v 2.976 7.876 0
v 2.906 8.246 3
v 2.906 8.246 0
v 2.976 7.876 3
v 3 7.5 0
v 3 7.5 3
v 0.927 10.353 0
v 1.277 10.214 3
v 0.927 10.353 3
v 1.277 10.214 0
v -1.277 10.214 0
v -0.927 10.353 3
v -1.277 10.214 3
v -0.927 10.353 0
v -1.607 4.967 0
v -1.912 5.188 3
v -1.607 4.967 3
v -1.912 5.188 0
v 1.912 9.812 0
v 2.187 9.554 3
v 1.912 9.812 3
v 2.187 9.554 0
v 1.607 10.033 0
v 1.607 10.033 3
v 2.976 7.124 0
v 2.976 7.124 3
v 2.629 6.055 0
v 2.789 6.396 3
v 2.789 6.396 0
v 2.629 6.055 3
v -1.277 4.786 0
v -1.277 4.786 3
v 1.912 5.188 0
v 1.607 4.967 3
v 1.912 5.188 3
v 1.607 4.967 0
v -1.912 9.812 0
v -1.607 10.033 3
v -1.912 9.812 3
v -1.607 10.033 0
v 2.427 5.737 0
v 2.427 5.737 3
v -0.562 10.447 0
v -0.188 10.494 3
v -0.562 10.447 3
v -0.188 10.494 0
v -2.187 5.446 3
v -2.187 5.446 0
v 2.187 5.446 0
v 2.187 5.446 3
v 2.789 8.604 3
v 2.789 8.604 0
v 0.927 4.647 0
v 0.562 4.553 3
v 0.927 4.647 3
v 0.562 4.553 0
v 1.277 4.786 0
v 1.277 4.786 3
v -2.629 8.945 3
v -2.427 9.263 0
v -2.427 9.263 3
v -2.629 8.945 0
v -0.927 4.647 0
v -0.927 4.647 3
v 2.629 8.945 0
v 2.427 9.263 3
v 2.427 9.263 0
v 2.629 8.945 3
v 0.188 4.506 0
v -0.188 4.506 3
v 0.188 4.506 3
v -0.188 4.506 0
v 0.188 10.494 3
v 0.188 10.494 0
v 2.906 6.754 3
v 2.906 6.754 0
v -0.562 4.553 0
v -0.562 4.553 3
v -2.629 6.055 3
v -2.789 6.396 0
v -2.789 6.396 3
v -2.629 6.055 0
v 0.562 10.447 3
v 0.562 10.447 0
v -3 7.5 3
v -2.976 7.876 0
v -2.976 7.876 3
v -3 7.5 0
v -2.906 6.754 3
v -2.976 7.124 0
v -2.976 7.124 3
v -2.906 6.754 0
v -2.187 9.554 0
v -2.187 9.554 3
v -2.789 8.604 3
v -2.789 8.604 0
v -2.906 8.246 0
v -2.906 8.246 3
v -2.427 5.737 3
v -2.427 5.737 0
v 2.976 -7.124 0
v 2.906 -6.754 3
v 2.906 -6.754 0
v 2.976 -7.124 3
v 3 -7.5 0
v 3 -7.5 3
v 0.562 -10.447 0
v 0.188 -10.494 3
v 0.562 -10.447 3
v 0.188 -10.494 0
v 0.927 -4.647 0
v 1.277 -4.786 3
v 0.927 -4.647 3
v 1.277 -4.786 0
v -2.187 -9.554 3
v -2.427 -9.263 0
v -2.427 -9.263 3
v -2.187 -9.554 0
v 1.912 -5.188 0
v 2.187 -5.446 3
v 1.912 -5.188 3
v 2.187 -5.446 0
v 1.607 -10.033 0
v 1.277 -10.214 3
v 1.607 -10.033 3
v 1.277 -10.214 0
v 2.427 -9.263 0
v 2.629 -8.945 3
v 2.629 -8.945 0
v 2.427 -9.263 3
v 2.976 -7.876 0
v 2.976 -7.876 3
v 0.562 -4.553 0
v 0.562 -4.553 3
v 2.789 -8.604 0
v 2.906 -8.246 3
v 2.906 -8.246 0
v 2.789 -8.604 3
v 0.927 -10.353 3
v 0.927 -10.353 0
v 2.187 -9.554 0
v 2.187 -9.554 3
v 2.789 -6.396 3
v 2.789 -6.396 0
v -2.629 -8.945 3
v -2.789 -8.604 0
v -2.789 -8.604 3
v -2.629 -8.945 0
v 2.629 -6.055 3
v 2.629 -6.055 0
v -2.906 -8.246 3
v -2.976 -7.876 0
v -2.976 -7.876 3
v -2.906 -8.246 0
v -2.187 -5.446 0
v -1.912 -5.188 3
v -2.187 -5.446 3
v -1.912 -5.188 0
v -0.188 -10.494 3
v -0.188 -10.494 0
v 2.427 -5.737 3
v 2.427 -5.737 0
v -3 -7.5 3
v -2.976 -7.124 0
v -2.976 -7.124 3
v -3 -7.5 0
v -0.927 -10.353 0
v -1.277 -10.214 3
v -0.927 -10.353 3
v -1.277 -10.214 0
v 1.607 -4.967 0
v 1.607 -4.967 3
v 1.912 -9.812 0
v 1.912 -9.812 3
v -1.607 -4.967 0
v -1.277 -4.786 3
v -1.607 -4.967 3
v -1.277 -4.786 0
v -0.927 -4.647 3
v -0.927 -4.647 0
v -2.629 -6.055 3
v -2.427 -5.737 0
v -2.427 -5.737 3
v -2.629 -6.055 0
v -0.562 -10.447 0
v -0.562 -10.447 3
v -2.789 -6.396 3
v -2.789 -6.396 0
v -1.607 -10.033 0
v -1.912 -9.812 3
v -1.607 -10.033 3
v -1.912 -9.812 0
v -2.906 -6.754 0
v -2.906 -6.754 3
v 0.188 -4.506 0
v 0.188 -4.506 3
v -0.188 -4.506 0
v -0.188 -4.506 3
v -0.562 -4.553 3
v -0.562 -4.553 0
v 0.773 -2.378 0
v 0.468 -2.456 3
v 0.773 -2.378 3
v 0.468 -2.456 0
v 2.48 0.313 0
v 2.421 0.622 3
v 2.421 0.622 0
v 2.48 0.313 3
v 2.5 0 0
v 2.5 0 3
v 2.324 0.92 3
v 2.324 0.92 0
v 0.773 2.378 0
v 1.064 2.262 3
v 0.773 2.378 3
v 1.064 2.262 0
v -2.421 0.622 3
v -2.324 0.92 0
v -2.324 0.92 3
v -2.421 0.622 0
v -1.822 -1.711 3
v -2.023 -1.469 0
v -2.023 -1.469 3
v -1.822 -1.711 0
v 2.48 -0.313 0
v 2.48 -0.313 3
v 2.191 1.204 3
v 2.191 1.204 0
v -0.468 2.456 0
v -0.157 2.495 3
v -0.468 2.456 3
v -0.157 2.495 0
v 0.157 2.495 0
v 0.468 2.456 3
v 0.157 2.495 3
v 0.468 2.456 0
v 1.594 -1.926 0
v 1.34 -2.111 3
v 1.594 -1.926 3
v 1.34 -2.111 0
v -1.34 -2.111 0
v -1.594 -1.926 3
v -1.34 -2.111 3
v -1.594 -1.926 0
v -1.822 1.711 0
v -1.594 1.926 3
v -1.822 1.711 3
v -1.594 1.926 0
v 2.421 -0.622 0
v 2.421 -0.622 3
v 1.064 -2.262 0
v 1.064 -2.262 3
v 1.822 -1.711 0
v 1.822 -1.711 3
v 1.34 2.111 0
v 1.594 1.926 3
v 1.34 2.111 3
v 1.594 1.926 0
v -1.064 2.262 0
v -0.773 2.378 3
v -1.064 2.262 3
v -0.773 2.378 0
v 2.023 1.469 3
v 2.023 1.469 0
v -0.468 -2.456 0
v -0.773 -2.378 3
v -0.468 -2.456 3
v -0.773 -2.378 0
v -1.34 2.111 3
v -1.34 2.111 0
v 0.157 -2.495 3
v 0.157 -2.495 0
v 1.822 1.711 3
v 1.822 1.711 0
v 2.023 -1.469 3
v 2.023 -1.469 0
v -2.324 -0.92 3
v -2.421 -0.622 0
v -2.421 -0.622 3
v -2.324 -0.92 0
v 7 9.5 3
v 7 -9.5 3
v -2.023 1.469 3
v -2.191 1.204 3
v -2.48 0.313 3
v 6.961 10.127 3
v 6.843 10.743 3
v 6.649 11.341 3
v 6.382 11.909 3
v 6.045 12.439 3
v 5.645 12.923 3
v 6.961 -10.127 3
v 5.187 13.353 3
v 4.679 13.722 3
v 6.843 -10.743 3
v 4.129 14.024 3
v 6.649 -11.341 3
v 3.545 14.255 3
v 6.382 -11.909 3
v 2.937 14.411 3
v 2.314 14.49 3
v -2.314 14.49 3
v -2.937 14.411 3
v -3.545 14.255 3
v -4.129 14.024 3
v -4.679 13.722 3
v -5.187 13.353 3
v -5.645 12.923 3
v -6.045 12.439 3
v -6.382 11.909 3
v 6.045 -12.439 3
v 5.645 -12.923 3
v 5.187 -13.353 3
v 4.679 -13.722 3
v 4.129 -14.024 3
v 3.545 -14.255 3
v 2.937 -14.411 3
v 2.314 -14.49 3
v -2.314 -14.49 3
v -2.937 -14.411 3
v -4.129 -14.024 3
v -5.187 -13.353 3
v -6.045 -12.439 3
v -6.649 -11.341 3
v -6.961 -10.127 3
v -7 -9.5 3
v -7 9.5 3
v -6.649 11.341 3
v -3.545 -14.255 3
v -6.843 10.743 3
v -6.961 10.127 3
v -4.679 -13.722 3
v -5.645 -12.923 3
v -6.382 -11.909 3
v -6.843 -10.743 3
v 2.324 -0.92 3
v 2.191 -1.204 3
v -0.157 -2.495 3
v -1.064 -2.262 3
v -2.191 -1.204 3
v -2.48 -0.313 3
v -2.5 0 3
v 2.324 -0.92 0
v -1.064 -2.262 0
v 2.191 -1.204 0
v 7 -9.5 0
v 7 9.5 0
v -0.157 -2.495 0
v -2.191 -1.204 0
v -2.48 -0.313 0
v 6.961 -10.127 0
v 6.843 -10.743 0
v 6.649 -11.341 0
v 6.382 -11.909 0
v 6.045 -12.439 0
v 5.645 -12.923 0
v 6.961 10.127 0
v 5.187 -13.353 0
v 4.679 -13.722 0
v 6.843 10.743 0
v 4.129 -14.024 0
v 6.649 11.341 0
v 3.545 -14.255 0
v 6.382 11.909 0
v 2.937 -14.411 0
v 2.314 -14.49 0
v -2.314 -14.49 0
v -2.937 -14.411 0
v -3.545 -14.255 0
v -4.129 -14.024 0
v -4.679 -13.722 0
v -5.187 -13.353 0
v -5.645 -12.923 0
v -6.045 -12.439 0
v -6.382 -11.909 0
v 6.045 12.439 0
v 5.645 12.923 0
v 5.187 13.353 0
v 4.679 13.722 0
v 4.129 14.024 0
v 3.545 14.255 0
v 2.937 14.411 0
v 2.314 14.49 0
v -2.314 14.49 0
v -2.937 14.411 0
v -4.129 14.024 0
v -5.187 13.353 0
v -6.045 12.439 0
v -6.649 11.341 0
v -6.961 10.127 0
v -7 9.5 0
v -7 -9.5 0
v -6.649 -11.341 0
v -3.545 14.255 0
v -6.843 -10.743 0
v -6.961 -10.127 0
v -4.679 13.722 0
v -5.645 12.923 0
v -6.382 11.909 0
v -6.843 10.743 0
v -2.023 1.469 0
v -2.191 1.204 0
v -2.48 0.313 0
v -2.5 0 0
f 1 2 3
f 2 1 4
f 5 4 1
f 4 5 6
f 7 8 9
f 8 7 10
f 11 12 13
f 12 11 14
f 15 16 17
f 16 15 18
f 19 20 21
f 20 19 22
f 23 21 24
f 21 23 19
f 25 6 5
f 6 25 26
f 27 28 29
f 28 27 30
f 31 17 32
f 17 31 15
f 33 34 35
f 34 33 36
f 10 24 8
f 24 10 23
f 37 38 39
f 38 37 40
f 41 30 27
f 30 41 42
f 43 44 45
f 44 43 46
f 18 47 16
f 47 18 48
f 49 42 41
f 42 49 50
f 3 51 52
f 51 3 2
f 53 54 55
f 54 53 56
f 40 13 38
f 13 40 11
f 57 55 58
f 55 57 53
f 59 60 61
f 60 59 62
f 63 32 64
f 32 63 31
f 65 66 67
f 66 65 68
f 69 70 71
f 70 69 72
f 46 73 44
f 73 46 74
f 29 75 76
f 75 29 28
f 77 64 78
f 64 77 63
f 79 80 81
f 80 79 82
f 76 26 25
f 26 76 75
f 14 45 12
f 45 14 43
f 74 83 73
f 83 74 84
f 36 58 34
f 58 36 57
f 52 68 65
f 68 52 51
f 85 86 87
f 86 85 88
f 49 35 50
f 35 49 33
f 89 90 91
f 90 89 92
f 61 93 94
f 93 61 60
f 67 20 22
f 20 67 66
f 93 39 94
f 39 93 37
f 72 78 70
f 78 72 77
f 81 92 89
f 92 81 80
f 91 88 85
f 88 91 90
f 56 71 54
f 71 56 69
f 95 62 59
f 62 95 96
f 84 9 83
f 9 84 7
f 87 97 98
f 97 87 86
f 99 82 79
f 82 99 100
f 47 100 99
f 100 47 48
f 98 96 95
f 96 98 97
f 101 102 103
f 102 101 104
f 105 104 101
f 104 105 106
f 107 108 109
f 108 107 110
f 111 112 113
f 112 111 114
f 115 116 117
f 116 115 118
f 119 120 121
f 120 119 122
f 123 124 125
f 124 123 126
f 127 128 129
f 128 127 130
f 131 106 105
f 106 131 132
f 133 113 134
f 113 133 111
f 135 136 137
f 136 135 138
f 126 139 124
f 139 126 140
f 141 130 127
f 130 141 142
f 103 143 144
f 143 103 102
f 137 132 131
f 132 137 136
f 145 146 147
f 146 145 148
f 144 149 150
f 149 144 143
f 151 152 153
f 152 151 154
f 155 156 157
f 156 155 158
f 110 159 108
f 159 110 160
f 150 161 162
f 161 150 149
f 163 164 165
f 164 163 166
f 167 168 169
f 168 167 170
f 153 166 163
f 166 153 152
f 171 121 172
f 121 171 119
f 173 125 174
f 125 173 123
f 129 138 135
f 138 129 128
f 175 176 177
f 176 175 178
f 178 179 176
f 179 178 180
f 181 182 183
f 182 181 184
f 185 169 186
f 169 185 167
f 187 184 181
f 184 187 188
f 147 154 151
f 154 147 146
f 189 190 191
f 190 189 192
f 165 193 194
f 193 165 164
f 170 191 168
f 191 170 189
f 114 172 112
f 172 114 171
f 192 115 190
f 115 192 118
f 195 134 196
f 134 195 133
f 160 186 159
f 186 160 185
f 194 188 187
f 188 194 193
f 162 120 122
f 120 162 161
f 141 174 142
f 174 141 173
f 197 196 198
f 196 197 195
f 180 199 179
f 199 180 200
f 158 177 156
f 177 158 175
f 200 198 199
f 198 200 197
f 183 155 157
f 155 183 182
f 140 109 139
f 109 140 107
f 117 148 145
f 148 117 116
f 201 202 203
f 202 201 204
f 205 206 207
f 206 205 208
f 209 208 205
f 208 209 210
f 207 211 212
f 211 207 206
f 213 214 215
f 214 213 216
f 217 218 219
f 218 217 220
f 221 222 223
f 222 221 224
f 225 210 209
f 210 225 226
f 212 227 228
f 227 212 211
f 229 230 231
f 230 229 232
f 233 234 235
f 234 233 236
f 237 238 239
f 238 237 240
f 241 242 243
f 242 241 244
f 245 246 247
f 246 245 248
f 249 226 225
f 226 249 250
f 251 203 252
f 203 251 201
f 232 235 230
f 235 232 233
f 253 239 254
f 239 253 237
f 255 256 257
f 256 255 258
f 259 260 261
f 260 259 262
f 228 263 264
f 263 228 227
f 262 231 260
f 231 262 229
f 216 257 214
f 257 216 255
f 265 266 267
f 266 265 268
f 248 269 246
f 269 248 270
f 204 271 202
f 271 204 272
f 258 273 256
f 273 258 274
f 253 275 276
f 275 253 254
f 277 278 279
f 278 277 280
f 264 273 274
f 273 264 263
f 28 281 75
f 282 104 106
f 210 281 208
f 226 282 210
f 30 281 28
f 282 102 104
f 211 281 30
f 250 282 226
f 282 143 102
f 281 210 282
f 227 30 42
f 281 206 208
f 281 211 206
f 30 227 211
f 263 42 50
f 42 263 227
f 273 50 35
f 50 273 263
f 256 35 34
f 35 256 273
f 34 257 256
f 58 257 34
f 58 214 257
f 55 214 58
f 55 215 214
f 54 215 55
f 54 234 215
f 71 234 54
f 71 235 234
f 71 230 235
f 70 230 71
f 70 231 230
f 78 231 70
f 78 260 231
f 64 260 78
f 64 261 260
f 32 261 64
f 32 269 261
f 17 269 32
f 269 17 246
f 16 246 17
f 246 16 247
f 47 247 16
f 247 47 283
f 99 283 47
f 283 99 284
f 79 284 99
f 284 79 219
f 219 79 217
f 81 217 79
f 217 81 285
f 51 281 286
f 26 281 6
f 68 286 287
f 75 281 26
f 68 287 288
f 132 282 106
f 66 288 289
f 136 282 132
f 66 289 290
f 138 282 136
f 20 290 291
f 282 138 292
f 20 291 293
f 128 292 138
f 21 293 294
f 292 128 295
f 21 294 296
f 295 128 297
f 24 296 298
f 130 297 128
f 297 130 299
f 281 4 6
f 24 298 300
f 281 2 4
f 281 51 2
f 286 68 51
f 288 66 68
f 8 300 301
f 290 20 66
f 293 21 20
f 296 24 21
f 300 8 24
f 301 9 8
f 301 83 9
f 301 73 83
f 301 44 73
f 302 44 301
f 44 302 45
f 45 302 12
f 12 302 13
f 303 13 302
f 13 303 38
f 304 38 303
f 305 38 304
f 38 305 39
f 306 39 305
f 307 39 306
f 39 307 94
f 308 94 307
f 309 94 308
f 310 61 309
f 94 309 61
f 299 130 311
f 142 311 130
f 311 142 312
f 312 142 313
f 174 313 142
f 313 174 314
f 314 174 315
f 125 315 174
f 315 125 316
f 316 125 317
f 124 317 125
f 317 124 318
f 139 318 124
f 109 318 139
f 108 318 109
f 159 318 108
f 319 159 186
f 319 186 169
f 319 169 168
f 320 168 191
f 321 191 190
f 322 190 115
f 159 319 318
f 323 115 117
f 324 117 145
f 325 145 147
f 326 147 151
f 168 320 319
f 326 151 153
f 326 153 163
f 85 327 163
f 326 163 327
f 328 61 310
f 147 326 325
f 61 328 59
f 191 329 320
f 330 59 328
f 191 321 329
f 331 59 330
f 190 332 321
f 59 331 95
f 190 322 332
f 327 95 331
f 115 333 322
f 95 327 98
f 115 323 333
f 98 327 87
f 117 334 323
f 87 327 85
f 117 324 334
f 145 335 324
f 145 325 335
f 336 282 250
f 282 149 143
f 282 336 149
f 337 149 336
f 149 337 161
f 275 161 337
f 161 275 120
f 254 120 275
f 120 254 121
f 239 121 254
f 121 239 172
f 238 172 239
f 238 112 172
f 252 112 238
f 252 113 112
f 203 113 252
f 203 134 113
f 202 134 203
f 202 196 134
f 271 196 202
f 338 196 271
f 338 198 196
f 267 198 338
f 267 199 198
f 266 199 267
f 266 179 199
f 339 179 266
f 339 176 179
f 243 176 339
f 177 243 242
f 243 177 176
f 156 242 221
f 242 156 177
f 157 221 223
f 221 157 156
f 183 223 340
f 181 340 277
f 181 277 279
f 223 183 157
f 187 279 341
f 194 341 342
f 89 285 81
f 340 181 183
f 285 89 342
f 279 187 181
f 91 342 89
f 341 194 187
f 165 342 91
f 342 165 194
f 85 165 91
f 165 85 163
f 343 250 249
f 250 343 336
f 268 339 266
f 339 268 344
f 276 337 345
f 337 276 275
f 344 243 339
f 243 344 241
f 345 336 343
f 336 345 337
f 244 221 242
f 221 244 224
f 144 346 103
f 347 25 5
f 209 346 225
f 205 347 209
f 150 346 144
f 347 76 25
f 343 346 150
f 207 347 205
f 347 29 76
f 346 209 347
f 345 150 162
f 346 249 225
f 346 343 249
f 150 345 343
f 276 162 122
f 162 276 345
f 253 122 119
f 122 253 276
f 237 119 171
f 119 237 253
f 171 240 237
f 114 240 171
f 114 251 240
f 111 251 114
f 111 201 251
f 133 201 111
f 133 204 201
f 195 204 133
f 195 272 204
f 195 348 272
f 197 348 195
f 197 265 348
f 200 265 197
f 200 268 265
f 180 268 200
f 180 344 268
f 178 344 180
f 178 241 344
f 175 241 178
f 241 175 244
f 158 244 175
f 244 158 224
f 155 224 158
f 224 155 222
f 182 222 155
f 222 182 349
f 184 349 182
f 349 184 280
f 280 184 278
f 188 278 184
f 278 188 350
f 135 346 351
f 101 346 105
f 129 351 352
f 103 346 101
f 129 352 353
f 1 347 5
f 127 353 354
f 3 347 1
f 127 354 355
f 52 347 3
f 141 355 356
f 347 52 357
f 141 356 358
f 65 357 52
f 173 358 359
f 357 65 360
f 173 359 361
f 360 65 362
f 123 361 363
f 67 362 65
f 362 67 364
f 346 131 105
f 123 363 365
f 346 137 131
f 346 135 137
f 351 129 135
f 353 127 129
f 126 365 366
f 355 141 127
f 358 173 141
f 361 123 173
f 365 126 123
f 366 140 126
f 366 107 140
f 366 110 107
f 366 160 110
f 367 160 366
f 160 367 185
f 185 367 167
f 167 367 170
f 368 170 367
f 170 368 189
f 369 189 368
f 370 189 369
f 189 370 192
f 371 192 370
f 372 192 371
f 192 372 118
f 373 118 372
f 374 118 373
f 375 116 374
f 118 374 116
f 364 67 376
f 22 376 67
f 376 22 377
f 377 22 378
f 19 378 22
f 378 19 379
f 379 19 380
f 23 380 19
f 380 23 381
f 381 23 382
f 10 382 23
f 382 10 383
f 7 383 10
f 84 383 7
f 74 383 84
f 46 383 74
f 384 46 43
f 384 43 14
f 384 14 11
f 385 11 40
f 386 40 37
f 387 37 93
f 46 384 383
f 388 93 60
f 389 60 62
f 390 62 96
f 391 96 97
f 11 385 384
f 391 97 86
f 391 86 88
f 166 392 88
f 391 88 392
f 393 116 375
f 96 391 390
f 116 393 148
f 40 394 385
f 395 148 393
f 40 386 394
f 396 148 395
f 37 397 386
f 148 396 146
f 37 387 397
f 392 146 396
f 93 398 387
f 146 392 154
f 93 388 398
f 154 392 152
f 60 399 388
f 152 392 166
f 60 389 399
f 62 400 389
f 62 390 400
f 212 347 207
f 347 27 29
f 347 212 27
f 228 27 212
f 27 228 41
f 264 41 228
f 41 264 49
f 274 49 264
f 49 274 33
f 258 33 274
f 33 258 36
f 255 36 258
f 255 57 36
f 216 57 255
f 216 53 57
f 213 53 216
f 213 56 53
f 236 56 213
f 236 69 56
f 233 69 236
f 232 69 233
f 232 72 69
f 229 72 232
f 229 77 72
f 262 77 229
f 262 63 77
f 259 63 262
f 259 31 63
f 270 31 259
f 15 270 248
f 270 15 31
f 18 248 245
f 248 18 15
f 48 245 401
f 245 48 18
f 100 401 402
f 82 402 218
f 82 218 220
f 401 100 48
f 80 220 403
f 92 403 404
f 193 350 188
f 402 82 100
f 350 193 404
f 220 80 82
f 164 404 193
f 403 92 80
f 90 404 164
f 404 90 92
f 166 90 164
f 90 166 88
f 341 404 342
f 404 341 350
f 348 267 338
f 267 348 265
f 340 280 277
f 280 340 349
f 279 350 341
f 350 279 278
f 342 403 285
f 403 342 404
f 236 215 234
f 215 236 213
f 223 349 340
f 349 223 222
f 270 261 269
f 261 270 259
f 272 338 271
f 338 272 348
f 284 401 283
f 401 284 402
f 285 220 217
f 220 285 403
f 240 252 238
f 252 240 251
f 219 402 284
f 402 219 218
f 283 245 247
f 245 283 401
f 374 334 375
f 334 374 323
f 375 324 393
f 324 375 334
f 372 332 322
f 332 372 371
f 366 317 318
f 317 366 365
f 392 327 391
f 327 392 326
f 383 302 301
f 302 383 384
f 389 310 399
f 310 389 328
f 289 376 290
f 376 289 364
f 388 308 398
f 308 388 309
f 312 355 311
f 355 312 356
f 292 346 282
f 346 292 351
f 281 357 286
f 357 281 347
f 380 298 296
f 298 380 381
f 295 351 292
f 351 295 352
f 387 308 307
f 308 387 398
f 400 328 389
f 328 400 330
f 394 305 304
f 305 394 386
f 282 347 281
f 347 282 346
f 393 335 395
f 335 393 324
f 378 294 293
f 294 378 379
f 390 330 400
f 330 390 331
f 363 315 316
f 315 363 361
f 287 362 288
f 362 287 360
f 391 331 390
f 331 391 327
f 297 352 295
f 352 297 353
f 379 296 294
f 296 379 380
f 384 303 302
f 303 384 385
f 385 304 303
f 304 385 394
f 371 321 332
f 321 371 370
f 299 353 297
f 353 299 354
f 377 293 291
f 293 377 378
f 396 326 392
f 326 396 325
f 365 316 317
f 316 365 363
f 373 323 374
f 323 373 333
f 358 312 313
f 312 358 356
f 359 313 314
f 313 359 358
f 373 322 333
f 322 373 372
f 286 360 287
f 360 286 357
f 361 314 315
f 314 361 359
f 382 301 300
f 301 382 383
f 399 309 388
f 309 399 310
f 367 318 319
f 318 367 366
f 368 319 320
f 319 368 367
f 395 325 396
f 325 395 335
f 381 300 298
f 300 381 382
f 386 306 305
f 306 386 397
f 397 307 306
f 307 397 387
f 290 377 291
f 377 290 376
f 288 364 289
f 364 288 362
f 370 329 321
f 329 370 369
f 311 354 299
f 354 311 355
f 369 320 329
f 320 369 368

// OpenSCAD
$fn = 50;


difference() {
	union() {
		hull() {
			translate(v = [-2.0000000000, 9.5000000000, 0]) {
				cylinder(h = 3, r = 5);
			}
			translate(v = [2.0000000000, 9.5000000000, 0]) {
				cylinder(h = 3, r = 5);
			}
			translate(v = [-2.0000000000, -9.5000000000, 0]) {
				cylinder(h = 3, r = 5);
			}
			translate(v = [2.0000000000, -9.5000000000, 0]) {
				cylinder(h = 3, r = 5);
			}
		}
	}
	union() {
		#translate(v = [0.0000000000, 7.5000000000, 0]) {
			cylinder(h = 3, r = 3.0000000000);
		}
		#translate(v = [0.0000000000, -7.5000000000, 0]) {
			cylinder(h = 3, r = 3.0000000000);
		}
		#translate(v = [0.0000000000, -7.5000000000, -100.0000000000]) {
			cylinder(h = 200, r = 3.0000000000);
		}
		#translate(v = [0.0000000000, -7.5000000000, -100.0000000000]) {
			cylinder(h = 200, r = 3.0000000000);
		}
		#translate(v = [0.0000000000, 7.5000000000, -100.0000000000]) {
			cylinder(h = 200, r = 3.0000000000);
		}
		#translate(v = [0.0000000000, 7.5000000000, -100.0000000000]) {
			cylinder(h = 200, r = 3.0000000000);
		}
		#translate(v = [0.0000000000, 7.5000000000, 0]) {
			cylinder(h = 3, r = 1.5000000000);
		}
		#translate(v = [0.0000000000, -7.5000000000, 0]) {
			cylinder(h = 3, r = 1.5000000000);
		}
		#translate(v = [0.0000000000, 7.5000000000, 0]) {
			cylinder(h = 3, r = 1.5000000000);
		}
		#translate(v = [0.0000000000, -7.5000000000, 0]) {
			cylinder(h = 3, r = 1.5000000000);
		}
		#translate(v = [0.0000000000, 7.5000000000, 0]) {
			cylinder(h = 3, r = 1.5000000000);
		}
		#translate(v = [0.0000000000, -7.5000000000, 0]) {
			cylinder(h = 3, r = 1.5000000000);
		}
		#cylinder(h = 3, r = 2.5000000000);
	}
}
